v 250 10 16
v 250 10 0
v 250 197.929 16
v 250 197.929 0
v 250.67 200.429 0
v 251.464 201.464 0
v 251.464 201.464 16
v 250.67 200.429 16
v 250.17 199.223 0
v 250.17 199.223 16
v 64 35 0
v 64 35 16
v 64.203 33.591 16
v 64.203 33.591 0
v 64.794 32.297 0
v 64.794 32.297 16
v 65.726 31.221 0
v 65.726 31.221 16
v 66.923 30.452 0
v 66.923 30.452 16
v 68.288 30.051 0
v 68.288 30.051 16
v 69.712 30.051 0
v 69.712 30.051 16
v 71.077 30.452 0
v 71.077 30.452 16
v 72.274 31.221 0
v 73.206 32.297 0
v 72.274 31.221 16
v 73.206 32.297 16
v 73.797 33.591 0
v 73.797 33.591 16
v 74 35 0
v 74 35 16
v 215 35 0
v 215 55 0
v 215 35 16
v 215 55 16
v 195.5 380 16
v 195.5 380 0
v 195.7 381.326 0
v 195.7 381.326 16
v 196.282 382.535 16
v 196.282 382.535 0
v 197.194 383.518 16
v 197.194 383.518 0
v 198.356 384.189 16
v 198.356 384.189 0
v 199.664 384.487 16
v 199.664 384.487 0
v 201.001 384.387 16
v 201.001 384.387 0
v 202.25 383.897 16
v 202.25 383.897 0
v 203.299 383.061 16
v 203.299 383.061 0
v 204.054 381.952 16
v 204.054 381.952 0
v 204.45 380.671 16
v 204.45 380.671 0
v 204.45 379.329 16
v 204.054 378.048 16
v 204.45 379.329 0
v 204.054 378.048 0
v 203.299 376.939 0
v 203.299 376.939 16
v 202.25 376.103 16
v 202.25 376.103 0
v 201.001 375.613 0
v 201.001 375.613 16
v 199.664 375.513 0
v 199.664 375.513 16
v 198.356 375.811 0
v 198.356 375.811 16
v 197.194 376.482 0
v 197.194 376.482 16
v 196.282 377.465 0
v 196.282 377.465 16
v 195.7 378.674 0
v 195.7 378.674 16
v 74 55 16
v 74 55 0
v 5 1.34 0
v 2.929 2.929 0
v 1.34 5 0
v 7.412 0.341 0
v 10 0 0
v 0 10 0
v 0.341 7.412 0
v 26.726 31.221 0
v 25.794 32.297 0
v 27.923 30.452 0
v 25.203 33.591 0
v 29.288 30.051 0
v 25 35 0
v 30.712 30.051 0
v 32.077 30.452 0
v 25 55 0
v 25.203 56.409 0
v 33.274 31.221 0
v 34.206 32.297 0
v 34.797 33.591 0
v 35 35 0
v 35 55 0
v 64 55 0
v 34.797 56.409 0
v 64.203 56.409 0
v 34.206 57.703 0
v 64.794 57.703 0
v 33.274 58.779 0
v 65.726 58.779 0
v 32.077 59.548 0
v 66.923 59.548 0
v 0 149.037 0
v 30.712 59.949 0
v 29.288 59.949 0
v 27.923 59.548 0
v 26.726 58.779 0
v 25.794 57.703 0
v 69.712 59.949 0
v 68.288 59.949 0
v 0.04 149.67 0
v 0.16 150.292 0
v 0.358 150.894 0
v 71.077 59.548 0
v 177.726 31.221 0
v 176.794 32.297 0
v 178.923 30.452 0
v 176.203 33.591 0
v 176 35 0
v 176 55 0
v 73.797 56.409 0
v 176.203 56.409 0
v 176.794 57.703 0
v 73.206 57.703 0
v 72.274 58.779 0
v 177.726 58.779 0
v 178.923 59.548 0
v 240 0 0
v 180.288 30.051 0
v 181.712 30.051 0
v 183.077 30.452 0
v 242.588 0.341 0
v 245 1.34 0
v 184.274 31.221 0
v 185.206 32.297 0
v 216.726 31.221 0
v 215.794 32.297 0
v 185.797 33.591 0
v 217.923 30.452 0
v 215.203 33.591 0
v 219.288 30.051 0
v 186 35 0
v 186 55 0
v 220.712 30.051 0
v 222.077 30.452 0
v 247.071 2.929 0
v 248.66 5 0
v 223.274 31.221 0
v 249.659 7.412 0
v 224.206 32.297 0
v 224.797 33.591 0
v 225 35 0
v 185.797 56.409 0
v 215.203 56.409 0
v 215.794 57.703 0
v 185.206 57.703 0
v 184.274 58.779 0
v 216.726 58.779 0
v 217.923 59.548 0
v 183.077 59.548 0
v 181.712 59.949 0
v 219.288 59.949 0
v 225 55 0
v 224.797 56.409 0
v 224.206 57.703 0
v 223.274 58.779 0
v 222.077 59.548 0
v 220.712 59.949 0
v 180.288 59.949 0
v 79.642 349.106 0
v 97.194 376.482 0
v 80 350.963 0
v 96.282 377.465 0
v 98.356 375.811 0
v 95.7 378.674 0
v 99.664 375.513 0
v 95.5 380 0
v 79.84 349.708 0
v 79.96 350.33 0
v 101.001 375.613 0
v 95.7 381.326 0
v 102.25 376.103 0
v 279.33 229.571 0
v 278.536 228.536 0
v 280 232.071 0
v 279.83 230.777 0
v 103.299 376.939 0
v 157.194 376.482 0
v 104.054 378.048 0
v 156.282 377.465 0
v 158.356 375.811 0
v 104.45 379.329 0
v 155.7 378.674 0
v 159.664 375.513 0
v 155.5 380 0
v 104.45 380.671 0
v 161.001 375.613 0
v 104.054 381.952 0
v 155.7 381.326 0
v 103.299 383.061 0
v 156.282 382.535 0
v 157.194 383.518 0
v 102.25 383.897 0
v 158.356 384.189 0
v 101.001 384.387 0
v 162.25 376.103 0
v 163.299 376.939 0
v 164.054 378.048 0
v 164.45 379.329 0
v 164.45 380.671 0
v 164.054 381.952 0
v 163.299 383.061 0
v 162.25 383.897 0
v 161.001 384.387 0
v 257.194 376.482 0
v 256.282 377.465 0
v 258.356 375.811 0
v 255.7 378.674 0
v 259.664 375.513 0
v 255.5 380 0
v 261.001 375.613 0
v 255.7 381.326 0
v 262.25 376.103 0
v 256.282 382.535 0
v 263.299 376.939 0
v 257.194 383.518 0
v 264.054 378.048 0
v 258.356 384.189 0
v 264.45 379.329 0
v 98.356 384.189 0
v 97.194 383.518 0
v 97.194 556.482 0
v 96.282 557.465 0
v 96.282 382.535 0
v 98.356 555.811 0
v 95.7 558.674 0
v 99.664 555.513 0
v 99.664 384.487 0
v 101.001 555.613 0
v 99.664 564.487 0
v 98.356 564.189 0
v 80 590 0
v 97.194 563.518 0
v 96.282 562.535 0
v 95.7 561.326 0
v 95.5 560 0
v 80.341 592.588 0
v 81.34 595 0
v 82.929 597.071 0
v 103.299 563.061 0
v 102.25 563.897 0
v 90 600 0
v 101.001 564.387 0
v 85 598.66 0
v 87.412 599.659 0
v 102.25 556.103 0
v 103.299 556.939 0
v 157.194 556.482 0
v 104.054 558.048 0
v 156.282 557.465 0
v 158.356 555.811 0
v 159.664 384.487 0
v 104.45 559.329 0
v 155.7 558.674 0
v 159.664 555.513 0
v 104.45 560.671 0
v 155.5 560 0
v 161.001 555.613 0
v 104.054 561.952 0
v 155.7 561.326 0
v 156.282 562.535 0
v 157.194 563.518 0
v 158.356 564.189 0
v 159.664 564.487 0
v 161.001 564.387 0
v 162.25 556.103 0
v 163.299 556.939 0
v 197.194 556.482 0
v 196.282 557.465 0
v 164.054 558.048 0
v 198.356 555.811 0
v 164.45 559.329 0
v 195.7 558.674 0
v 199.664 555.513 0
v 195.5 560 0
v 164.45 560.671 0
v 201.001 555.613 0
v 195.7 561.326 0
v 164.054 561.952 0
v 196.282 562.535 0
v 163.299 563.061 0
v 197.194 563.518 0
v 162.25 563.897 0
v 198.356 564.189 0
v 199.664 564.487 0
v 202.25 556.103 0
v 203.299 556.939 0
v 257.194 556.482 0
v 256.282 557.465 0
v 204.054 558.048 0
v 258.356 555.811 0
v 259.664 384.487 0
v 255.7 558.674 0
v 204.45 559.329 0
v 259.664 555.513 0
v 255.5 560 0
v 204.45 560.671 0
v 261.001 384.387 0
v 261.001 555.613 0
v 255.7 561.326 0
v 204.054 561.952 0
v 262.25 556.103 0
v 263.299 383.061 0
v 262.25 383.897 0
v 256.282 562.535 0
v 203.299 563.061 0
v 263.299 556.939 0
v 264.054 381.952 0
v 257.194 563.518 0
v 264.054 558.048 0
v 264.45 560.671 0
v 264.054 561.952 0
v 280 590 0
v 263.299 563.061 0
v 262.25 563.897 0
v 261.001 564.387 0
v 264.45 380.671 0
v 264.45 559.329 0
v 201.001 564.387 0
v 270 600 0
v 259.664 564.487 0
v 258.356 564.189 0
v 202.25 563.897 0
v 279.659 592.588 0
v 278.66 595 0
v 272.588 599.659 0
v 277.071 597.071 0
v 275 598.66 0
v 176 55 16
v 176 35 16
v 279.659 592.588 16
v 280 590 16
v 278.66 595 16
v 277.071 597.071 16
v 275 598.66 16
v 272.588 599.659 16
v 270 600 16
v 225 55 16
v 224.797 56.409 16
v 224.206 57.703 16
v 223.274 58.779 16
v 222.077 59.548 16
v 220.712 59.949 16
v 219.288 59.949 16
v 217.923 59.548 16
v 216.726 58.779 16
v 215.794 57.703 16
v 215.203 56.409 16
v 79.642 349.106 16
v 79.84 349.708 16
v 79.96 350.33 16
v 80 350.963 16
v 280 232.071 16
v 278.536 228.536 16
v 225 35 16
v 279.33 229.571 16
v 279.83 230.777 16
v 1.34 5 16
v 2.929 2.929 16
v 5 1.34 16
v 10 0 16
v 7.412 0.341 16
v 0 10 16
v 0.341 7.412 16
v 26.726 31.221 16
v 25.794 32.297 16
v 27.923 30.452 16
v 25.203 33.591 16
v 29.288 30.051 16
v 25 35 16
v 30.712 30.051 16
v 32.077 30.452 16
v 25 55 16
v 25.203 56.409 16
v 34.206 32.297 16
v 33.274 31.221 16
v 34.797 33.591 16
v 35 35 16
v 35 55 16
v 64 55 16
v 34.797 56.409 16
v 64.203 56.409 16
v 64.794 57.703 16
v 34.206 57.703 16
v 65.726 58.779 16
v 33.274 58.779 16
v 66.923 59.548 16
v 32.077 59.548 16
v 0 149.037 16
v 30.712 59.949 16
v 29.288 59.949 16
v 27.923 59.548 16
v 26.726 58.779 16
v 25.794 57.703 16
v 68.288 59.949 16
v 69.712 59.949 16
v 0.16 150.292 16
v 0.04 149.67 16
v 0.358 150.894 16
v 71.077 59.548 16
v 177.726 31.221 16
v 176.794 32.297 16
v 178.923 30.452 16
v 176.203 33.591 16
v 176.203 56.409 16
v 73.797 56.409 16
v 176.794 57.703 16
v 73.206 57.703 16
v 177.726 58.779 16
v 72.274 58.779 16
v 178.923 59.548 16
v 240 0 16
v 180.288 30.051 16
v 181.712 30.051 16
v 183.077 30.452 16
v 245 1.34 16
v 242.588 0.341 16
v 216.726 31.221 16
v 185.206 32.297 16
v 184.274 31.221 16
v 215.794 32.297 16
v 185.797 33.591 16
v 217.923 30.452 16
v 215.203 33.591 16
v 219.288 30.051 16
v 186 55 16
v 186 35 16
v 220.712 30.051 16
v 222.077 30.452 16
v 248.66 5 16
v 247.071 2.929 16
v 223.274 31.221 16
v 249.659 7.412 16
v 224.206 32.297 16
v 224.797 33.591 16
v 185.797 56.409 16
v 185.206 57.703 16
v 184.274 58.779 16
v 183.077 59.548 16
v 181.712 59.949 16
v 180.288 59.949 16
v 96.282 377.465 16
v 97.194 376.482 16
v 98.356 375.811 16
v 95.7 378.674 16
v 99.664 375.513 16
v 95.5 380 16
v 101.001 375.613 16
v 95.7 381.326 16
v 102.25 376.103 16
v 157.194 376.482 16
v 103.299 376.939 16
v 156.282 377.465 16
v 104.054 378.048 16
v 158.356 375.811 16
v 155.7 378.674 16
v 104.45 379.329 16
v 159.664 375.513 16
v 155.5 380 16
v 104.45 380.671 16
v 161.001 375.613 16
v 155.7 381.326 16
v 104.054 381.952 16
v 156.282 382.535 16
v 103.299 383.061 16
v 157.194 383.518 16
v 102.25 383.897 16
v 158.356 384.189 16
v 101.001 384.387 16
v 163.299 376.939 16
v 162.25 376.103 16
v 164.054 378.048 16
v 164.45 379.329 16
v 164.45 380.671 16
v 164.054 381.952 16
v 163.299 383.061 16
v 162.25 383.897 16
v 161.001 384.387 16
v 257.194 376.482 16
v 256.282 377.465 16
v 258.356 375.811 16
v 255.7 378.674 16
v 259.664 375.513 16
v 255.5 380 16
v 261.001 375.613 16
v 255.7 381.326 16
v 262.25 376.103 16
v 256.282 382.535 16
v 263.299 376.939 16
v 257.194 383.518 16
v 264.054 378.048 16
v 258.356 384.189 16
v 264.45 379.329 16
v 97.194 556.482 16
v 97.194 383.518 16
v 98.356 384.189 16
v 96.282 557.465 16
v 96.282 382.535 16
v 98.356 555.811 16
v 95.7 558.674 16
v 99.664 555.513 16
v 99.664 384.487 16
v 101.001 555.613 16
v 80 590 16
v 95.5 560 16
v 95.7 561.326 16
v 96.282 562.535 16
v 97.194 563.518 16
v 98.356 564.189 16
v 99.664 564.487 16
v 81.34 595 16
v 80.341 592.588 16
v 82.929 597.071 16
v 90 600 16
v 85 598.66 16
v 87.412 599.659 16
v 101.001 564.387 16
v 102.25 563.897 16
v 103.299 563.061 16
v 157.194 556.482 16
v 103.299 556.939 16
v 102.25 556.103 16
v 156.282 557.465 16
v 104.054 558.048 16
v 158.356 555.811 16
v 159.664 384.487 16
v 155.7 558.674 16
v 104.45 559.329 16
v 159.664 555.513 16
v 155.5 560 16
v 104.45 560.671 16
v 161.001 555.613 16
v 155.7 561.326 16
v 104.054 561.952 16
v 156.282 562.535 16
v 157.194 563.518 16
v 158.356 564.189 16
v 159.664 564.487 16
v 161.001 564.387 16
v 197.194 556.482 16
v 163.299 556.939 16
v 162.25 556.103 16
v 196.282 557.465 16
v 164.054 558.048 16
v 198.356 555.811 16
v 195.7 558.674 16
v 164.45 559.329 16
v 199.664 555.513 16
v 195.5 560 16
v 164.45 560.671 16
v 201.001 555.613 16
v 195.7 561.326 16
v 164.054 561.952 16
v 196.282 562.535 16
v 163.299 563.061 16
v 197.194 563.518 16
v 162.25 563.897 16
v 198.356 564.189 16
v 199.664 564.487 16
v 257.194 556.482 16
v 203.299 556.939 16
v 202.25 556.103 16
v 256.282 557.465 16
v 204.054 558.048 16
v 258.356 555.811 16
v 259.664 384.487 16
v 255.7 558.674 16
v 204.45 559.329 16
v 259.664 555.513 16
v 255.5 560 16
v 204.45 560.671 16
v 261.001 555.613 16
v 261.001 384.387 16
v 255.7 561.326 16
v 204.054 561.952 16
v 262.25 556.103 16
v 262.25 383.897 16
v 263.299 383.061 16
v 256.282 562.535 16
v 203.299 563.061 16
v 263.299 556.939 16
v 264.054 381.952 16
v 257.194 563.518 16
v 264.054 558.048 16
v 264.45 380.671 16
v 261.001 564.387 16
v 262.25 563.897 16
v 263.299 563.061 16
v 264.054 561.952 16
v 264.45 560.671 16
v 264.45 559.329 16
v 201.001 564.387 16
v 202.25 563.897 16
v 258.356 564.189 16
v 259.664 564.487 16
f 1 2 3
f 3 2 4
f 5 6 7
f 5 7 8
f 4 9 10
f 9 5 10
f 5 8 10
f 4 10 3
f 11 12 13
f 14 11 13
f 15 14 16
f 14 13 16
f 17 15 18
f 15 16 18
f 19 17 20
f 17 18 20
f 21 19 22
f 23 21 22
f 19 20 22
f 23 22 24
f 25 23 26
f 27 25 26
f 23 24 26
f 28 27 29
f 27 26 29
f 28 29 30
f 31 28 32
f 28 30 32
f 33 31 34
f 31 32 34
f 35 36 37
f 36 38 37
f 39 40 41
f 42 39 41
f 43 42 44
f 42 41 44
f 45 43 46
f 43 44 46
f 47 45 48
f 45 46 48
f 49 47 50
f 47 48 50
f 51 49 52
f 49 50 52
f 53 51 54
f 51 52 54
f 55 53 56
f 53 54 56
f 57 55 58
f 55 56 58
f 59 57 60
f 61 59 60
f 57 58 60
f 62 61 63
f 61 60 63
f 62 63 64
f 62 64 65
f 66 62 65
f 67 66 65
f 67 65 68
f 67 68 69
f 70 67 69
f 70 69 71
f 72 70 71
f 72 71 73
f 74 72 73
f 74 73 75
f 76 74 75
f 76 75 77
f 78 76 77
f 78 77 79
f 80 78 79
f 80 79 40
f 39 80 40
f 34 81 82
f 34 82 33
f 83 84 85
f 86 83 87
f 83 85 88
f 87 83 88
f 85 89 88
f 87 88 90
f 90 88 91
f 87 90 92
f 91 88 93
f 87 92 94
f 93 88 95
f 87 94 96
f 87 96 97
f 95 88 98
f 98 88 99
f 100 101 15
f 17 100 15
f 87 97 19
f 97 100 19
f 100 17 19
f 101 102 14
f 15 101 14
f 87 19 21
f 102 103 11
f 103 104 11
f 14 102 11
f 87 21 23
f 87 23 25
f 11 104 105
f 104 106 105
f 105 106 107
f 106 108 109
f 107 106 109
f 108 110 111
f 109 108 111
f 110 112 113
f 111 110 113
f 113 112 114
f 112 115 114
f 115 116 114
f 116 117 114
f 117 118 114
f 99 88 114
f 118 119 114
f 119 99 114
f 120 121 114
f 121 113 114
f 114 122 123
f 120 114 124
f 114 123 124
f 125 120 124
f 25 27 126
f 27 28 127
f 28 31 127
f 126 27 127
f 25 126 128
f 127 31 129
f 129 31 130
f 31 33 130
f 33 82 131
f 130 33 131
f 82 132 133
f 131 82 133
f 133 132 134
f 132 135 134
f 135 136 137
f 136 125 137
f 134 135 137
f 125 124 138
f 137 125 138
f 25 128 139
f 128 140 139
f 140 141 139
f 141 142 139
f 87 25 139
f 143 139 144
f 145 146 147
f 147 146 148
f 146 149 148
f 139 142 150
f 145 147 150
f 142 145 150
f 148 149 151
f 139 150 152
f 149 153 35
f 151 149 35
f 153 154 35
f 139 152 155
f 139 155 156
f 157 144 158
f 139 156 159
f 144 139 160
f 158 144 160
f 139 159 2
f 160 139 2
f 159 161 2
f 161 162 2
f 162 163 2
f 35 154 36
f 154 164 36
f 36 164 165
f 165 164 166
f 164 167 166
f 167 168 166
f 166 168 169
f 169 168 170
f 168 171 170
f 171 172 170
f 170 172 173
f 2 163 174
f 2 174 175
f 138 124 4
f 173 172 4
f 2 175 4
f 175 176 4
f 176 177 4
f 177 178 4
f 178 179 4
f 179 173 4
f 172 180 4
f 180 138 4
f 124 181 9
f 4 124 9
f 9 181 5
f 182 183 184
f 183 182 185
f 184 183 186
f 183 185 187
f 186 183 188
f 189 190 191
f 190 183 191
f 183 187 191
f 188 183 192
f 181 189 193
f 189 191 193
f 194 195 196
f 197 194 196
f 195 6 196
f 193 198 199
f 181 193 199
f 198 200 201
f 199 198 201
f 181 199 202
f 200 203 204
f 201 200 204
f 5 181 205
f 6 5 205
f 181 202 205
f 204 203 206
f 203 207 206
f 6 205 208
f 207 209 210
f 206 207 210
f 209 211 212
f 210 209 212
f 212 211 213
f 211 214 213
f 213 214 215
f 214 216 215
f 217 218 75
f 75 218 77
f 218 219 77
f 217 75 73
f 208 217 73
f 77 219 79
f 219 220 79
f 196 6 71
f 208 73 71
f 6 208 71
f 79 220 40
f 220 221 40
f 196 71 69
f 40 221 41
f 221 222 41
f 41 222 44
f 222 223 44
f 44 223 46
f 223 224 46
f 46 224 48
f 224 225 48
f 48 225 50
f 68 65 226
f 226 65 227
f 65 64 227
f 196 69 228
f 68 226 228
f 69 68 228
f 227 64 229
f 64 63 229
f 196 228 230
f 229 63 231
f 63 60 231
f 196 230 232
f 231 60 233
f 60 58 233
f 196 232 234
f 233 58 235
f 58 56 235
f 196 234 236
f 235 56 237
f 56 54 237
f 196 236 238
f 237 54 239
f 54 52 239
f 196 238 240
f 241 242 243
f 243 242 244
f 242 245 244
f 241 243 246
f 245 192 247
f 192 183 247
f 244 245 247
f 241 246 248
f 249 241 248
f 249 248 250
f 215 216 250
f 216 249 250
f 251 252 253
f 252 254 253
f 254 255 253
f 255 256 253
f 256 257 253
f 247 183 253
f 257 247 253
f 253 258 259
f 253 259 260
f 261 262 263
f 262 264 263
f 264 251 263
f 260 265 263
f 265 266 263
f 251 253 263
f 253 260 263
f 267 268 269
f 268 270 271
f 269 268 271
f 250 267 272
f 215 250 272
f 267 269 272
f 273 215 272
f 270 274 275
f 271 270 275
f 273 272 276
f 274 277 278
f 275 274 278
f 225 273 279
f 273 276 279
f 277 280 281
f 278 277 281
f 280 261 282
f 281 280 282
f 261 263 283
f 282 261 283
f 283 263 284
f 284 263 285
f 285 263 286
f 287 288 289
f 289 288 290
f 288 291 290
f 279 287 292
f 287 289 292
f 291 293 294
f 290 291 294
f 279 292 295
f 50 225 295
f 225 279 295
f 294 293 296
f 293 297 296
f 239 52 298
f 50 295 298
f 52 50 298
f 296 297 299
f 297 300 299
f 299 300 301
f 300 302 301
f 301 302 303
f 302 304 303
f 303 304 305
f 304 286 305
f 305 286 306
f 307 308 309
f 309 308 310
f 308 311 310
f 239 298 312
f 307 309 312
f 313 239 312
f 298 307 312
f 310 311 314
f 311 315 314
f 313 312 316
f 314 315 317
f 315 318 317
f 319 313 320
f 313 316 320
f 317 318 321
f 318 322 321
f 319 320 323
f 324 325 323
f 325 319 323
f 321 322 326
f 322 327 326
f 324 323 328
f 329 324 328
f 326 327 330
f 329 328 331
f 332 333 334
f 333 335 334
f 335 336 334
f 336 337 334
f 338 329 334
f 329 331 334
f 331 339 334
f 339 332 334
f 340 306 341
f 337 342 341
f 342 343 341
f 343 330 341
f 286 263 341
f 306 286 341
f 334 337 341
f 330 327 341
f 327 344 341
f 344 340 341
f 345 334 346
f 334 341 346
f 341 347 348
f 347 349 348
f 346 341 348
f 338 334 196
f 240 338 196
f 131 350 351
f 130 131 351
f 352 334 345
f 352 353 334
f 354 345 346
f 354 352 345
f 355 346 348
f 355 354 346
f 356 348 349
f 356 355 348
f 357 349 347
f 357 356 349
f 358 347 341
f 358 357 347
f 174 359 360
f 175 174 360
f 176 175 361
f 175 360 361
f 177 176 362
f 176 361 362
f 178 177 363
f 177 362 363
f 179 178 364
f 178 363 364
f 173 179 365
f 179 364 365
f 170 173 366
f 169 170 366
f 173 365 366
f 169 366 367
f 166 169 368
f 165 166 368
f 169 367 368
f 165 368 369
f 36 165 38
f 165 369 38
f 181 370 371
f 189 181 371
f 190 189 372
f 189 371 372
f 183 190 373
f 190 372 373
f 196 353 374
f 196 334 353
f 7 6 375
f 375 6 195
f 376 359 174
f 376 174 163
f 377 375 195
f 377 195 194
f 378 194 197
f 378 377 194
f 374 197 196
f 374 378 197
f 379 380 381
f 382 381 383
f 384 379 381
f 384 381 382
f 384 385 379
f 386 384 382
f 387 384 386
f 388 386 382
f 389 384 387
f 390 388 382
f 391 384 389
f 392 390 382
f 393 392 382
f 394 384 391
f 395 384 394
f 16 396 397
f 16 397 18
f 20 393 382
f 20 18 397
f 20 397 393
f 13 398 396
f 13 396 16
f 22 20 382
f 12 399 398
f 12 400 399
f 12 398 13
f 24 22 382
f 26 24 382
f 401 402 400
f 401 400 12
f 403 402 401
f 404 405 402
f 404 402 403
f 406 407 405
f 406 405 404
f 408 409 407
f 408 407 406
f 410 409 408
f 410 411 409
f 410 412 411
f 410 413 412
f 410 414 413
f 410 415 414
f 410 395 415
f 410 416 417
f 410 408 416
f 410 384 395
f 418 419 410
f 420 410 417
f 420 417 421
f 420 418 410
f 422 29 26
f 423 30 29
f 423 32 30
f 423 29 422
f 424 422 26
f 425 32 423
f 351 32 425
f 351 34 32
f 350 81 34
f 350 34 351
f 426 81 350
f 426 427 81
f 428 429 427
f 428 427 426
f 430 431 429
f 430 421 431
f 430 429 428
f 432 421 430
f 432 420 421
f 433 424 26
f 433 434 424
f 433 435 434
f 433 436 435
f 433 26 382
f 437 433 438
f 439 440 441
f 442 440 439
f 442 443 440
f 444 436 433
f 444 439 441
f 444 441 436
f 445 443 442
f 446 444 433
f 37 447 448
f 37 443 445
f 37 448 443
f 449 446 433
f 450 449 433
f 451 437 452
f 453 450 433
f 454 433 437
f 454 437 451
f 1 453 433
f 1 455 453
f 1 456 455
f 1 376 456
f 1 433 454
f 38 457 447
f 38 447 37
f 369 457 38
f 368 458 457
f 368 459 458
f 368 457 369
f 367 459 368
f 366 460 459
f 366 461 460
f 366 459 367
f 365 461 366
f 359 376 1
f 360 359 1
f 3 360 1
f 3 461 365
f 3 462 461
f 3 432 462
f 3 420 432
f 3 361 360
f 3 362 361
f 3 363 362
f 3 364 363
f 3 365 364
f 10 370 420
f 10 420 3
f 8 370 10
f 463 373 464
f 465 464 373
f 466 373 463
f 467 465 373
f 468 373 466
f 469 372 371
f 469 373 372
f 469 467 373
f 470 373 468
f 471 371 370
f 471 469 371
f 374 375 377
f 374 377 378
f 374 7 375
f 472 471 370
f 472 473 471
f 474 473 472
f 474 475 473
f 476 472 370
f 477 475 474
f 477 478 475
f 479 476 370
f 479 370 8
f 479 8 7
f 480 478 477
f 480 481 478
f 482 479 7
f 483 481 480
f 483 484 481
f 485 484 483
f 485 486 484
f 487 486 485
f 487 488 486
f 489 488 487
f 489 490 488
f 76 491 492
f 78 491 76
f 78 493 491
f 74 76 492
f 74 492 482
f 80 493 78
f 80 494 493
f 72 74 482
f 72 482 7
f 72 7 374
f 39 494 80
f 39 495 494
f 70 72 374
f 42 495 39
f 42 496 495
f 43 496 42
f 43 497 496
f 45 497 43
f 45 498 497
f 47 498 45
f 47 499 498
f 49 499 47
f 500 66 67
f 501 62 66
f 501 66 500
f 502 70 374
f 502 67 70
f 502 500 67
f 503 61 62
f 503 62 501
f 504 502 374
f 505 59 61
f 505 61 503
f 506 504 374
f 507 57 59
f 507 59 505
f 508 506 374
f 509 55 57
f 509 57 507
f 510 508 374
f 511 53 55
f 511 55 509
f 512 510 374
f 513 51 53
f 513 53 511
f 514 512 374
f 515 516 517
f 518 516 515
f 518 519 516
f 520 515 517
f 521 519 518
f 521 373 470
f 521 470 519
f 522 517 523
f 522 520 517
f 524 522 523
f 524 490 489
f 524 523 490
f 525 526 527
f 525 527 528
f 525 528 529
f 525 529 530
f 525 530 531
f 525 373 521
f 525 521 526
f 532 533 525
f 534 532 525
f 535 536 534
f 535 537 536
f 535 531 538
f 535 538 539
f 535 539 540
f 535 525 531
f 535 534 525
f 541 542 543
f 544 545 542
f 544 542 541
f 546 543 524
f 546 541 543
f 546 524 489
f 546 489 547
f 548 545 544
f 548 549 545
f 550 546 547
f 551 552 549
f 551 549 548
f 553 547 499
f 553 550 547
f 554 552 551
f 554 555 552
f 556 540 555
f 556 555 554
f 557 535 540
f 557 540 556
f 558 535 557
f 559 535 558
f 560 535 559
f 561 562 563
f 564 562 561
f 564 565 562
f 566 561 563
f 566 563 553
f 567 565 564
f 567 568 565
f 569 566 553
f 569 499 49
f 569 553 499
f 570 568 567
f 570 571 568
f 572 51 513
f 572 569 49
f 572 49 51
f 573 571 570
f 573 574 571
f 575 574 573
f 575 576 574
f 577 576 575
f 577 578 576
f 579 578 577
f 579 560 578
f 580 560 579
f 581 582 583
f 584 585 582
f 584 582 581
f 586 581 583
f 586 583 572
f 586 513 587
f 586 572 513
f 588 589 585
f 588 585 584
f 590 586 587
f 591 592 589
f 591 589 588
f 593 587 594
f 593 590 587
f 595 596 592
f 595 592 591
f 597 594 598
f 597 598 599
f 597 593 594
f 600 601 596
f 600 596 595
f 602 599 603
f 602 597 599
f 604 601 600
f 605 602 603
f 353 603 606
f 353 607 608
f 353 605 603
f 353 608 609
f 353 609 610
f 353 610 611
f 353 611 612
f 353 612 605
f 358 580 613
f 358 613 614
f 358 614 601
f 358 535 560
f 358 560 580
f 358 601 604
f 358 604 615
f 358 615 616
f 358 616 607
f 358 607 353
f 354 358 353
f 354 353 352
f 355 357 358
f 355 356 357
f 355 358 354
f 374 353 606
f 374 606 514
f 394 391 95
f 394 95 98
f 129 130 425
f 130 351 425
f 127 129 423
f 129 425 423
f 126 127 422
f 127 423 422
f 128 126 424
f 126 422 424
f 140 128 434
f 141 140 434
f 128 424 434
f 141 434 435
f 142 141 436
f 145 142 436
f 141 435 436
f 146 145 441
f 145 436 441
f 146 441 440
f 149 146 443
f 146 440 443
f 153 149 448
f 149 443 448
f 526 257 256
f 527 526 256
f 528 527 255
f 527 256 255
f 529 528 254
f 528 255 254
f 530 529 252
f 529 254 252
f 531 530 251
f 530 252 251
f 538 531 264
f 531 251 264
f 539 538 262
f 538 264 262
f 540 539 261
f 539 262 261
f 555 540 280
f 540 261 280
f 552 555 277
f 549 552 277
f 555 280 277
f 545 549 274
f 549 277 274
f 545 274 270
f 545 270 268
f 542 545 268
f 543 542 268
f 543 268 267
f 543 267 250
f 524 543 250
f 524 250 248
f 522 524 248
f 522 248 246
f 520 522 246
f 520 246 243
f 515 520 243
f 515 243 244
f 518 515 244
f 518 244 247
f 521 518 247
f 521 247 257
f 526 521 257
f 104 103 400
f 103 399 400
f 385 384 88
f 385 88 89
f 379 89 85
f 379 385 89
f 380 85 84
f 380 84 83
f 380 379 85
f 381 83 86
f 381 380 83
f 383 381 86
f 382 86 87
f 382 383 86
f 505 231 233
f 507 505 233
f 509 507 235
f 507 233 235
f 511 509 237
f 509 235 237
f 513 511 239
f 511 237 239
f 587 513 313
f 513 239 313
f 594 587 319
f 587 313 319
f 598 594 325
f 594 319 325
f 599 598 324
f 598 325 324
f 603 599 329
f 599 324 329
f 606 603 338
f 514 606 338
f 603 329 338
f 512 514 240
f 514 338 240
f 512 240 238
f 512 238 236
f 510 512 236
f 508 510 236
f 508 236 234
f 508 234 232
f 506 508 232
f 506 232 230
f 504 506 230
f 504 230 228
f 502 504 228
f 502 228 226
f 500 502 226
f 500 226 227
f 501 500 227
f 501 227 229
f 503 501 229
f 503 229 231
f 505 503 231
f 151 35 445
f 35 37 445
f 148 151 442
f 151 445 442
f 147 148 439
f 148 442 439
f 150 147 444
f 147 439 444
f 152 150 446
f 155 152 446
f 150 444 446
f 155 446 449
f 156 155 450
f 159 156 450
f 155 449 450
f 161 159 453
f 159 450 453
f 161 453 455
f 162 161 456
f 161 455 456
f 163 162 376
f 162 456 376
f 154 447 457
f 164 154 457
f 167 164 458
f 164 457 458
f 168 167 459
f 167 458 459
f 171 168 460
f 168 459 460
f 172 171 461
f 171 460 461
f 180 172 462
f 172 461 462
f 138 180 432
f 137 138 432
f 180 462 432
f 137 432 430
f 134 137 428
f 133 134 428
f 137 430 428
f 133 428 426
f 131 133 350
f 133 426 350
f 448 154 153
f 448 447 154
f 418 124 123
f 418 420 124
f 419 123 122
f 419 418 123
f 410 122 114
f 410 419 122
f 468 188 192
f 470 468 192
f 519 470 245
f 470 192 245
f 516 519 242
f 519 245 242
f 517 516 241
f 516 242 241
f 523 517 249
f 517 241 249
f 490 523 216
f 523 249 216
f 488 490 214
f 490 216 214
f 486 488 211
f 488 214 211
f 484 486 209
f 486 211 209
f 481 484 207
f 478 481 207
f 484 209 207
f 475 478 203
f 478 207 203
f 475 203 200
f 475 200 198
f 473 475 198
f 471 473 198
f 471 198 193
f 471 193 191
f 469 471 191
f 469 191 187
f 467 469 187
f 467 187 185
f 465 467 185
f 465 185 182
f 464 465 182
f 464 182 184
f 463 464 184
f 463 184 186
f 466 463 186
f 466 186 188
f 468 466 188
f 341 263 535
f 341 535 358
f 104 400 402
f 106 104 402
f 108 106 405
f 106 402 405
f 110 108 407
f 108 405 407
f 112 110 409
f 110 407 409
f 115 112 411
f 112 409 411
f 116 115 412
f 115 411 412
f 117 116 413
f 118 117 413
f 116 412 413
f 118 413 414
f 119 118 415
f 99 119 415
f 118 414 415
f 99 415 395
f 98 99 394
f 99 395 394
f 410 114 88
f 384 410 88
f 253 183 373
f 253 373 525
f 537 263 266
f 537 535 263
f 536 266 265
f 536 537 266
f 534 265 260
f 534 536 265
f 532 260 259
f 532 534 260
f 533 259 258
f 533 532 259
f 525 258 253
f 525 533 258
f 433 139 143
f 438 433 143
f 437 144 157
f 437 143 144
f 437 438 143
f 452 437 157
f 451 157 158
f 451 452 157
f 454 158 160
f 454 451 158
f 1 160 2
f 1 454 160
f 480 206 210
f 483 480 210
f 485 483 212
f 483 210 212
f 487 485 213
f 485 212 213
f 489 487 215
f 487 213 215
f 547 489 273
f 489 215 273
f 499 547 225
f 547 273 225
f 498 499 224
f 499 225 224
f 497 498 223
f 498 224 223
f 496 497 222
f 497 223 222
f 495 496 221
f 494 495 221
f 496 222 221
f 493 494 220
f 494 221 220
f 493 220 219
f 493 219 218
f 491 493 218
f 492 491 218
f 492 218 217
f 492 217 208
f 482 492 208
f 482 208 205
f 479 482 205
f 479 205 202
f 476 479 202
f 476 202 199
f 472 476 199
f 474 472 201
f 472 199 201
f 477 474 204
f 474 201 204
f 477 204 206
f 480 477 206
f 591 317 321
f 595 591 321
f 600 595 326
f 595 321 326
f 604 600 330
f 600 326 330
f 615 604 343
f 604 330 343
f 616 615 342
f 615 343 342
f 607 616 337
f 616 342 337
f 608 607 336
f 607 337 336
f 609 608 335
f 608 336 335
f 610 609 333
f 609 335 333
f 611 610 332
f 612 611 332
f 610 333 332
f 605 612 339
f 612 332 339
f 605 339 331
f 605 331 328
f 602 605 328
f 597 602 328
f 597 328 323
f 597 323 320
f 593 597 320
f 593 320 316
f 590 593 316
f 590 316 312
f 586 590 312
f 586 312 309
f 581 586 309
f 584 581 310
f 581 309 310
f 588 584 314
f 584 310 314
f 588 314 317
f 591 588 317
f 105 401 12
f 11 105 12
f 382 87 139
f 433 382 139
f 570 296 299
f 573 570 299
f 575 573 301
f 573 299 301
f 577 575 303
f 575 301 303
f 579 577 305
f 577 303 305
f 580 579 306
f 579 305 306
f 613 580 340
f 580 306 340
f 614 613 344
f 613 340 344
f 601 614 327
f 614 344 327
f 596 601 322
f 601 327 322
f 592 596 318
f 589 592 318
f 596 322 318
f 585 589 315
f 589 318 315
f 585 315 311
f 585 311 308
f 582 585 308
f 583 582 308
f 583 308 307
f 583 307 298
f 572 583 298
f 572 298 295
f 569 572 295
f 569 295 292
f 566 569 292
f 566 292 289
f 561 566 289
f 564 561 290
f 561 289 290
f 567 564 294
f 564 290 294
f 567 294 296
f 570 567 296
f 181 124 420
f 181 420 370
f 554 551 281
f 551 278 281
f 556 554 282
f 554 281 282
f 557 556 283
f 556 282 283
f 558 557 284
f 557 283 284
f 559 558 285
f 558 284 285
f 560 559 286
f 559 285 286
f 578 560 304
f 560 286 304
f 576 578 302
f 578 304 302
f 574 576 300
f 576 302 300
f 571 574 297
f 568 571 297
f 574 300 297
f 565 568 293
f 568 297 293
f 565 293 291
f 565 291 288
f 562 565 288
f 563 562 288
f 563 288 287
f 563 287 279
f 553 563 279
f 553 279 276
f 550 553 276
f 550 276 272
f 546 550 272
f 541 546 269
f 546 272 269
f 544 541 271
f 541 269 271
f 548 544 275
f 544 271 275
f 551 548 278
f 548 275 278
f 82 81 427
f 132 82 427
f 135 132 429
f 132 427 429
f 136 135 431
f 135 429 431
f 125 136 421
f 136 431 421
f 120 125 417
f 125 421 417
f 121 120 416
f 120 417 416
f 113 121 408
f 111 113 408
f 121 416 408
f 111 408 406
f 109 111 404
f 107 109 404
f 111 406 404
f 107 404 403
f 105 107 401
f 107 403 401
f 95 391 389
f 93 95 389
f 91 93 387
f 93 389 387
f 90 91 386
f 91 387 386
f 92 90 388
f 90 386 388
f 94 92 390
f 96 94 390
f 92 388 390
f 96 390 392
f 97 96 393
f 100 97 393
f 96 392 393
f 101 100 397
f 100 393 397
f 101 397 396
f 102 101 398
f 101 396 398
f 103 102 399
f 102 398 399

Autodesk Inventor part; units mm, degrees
ref_plane "YZ Plane" through (0, 0, 0) normal (1, 0, 0) x (0, 1, 0)
ref_plane "XZ Plane" through (0, 0, 0) normal (0, 1, 0) x (-1, 0, 0)
ref_plane "XY Plane" through (0, 0, 0) normal (0, 0, 1) x (1, 0, 0)
sketch "Sketch1" plane through (0, 0, 0) normal (0, 0, 1) x (1, 0, 0)
  line L0 (0, 0) -> (250, 0)
  line L1 (250, 0) -> (250, 150)
  line L2 (0, 150) -> (0, 0)
  line L3 (0, 150) -> (80, 350)
  line L4 (80, 350) -> (80, 600)
  line L5 (280, 600) -> (280, 230)
  line L6 (250, 150) -> (250, 200)
  line L7 (250, 200) -> (280, 230)
  line L8 (80, 600) -> (280, 600)
  dimension "d0" = 250
  dimension "d1" = 150
  dimension "d3" = 80
  dimension "d5" = 30
  dimension "d6" = 50
  dimension "d8" = 600
  dimension "d9" = 200
  dimension "d10" = 30
  dimension "d11" = 150
extrude "Extrusion1" add sketch "Sketch1" along normal blind 16
fillet "Fillet1" radius 10 4 edges at (80, 600, 8) (280, 600, 8) (0, 0, 8) (250, 0, 8)
sketch "Sketch9" plane through (0, 0, 16) normal (0, 0, 1) x (1, 0, 0)
  line L0 (0, 150) -> (0, 10) projected
  line L1 (0, 35) -> (250, 35)
  line L2 (250, 10) -> (250, 200) projected
  line L3 (10, 0) -> (240, 0) projected
  circle A0 centre (30, 35) radius 5
  circle A1 centre (69, 35) radius 5
  circle A2 centre (181, 35) radius 5
  circle A3 centre (220, 35) radius 5
  line L4 (25, 35) -> (25, 55)
  line L5 (35, 35) -> (35, 55)
  circle A4 centre (30, 55) radius 5
  circle A5 centre (69, 55) radius 5
  line L6 (64, 55) -> (64, 35)
  line L7 (74, 55) -> (74, 35)
  line L8 (0, 100) -> (250, 100)
  circle A6 centre (125, 50) radius 5
  circle A7 centre (220, 55) radius 5
  line L9 (215, 55) -> (215, 35)
  line L10 (225, 55) -> (225, 35)
  circle A8 centre (181, 55) radius 5
  line L11 (176, 55) -> (176, 35)
  line L12 (186, 55) -> (186, 35)
  point P0 (0, 0)
  point P1 (0, 148.0742)
  point P2 (250, 196.6667)
  point P3 (125, 100)
  dimension "d111" = 35
  dimension "d112" = 30
  dimension "d113" = 10
  dimension "d114" = 20
  dimension "d116" = 10
  dimension "d117" = 10
  dimension "d118" = 10
  dimension "d119" = 20
  dimension "d120" = 100
  dimension "d121" = 10
  dimension "d122" = 50
  dimension "d123" = 30
  dimension "d124" = 20
  dimension "d127" = 29
  dimension "d128" = 29
  dimension "d129" = 20
  dimension "d153" = 10
  dimension "d154" = 0
  dimension "d155" = 10
  dimension "d156" = 10
  dimension "d157" = 10
extrude "Extrusion7" cut sketch "Sketch9" against normal through all contours A0 L1 | L4 A4 L5 A0 | L1 A0 | A4 | A3 L1 | L1 A3 | A3 L9 A7 L10 | A1 L1 | L6 A5 L7 A1 | L1 A1 | A7 | A5 | A2 L1 | L1 A2 | A2 L11 A8 L12 | A8
sketch "Sketch10" plane through (0, 0, 0) normal (0, 0, -1) x (-1, 0, 0)
  line L0 (-280, 230) -> (-280, 590) projected
  line L1 (-280, 560) -> (-80, 560)
  line L2 (-80, 590) -> (-80, 350) projected
  line L3 (-270, 600) -> (-90, 600) projected
  line L4 (-270, 600) -> (-90, 600) projected
  line L5 (-180, 600) -> (-180, 520)
  line L6 (-200, 580) -> (-160, 580)
  line L7 (-160, 580) -> (-160, 540)
  line L8 (-160, 540) -> (-200, 540)
  line L9 (-200, 540) -> (-200, 580)
  line L10 (-200, 580) -> (-160, 540) construction
  line L11 (-160, 580) -> (-200, 540) construction
  circle A0 centre (-200, 560) radius 4.5
  circle A1 centre (-160, 560) radius 4.5
  circle A2 centre (-260, 560) radius 4.5
  circle A3 centre (-100, 560) radius 4.5
  line L12 (-180, 520) -> (-180, 380)
  line L13 (-200, 400) -> (-160, 400)
  line L14 (-160, 400) -> (-160, 360)
  line L15 (-160, 360) -> (-200, 360)
  line L16 (-200, 360) -> (-200, 400)
  line L17 (-200, 400) -> (-160, 360) construction
  line L18 (-160, 400) -> (-200, 360) construction
  line L19 (-280, 380) -> (-80, 380)
  circle A4 centre (-260, 380) radius 4.5
  circle A5 centre (-100, 380) radius 4.5
  circle A6 centre (-200, 380) radius 4.5
  circle A7 centre (-160, 380) radius 4.5
  point P0 (0, 0)
  point P1 (-280, 243.3333)
  point P2 (-80, 351.9258)
  point P3 (-180, 560)
  dimension "d130" = 40
  dimension "d131" = 80
  dimension "d132" = 40
  dimension "d133" = 40
  dimension "d134" = 9
  dimension "d135" = 9
  dimension "d136" = 9
  dimension "d137" = 9
  dimension "d138" = 60
  dimension "d139" = 60
  dimension "d140" = 140
  dimension "d141" = 40
  dimension "d142" = 40
  dimension "d143" = 9
  dimension "d144" = 220
  dimension "d145" = 9
  dimension "d146" = 9
  dimension "d147" = 9
  dimension "d148" = 60
  dimension "d149" = 60
extrude "Extrusion8" cut sketch "Sketch10" against normal through all contours A4 L19 | L19 A4 | A2 L1 | L1 A2 | A6 L16 L19 | L19 L16 A6 | A0 L9 L1 | L1 L9 A0 | L19 A6 L16 | L16 A6 L19 | L9 A0 L1 | L1 A0 L9 | A7 L14 L19 | L19 L14 A7 | L14 L19 A7 | A1 L7 L1 | L1 L7 A1 | L14 A7 L19 | L7 A1 L1 | L1 A1 L7 | A5 L19 | L19 A5 | A3 L1 | L1 A3
fillet "Fillet3" radius 5 4 edges at (280, 230, 8) (250, 200, 8) (0, 150, 8) (80, 350, 8)
properties part number "PA1"
